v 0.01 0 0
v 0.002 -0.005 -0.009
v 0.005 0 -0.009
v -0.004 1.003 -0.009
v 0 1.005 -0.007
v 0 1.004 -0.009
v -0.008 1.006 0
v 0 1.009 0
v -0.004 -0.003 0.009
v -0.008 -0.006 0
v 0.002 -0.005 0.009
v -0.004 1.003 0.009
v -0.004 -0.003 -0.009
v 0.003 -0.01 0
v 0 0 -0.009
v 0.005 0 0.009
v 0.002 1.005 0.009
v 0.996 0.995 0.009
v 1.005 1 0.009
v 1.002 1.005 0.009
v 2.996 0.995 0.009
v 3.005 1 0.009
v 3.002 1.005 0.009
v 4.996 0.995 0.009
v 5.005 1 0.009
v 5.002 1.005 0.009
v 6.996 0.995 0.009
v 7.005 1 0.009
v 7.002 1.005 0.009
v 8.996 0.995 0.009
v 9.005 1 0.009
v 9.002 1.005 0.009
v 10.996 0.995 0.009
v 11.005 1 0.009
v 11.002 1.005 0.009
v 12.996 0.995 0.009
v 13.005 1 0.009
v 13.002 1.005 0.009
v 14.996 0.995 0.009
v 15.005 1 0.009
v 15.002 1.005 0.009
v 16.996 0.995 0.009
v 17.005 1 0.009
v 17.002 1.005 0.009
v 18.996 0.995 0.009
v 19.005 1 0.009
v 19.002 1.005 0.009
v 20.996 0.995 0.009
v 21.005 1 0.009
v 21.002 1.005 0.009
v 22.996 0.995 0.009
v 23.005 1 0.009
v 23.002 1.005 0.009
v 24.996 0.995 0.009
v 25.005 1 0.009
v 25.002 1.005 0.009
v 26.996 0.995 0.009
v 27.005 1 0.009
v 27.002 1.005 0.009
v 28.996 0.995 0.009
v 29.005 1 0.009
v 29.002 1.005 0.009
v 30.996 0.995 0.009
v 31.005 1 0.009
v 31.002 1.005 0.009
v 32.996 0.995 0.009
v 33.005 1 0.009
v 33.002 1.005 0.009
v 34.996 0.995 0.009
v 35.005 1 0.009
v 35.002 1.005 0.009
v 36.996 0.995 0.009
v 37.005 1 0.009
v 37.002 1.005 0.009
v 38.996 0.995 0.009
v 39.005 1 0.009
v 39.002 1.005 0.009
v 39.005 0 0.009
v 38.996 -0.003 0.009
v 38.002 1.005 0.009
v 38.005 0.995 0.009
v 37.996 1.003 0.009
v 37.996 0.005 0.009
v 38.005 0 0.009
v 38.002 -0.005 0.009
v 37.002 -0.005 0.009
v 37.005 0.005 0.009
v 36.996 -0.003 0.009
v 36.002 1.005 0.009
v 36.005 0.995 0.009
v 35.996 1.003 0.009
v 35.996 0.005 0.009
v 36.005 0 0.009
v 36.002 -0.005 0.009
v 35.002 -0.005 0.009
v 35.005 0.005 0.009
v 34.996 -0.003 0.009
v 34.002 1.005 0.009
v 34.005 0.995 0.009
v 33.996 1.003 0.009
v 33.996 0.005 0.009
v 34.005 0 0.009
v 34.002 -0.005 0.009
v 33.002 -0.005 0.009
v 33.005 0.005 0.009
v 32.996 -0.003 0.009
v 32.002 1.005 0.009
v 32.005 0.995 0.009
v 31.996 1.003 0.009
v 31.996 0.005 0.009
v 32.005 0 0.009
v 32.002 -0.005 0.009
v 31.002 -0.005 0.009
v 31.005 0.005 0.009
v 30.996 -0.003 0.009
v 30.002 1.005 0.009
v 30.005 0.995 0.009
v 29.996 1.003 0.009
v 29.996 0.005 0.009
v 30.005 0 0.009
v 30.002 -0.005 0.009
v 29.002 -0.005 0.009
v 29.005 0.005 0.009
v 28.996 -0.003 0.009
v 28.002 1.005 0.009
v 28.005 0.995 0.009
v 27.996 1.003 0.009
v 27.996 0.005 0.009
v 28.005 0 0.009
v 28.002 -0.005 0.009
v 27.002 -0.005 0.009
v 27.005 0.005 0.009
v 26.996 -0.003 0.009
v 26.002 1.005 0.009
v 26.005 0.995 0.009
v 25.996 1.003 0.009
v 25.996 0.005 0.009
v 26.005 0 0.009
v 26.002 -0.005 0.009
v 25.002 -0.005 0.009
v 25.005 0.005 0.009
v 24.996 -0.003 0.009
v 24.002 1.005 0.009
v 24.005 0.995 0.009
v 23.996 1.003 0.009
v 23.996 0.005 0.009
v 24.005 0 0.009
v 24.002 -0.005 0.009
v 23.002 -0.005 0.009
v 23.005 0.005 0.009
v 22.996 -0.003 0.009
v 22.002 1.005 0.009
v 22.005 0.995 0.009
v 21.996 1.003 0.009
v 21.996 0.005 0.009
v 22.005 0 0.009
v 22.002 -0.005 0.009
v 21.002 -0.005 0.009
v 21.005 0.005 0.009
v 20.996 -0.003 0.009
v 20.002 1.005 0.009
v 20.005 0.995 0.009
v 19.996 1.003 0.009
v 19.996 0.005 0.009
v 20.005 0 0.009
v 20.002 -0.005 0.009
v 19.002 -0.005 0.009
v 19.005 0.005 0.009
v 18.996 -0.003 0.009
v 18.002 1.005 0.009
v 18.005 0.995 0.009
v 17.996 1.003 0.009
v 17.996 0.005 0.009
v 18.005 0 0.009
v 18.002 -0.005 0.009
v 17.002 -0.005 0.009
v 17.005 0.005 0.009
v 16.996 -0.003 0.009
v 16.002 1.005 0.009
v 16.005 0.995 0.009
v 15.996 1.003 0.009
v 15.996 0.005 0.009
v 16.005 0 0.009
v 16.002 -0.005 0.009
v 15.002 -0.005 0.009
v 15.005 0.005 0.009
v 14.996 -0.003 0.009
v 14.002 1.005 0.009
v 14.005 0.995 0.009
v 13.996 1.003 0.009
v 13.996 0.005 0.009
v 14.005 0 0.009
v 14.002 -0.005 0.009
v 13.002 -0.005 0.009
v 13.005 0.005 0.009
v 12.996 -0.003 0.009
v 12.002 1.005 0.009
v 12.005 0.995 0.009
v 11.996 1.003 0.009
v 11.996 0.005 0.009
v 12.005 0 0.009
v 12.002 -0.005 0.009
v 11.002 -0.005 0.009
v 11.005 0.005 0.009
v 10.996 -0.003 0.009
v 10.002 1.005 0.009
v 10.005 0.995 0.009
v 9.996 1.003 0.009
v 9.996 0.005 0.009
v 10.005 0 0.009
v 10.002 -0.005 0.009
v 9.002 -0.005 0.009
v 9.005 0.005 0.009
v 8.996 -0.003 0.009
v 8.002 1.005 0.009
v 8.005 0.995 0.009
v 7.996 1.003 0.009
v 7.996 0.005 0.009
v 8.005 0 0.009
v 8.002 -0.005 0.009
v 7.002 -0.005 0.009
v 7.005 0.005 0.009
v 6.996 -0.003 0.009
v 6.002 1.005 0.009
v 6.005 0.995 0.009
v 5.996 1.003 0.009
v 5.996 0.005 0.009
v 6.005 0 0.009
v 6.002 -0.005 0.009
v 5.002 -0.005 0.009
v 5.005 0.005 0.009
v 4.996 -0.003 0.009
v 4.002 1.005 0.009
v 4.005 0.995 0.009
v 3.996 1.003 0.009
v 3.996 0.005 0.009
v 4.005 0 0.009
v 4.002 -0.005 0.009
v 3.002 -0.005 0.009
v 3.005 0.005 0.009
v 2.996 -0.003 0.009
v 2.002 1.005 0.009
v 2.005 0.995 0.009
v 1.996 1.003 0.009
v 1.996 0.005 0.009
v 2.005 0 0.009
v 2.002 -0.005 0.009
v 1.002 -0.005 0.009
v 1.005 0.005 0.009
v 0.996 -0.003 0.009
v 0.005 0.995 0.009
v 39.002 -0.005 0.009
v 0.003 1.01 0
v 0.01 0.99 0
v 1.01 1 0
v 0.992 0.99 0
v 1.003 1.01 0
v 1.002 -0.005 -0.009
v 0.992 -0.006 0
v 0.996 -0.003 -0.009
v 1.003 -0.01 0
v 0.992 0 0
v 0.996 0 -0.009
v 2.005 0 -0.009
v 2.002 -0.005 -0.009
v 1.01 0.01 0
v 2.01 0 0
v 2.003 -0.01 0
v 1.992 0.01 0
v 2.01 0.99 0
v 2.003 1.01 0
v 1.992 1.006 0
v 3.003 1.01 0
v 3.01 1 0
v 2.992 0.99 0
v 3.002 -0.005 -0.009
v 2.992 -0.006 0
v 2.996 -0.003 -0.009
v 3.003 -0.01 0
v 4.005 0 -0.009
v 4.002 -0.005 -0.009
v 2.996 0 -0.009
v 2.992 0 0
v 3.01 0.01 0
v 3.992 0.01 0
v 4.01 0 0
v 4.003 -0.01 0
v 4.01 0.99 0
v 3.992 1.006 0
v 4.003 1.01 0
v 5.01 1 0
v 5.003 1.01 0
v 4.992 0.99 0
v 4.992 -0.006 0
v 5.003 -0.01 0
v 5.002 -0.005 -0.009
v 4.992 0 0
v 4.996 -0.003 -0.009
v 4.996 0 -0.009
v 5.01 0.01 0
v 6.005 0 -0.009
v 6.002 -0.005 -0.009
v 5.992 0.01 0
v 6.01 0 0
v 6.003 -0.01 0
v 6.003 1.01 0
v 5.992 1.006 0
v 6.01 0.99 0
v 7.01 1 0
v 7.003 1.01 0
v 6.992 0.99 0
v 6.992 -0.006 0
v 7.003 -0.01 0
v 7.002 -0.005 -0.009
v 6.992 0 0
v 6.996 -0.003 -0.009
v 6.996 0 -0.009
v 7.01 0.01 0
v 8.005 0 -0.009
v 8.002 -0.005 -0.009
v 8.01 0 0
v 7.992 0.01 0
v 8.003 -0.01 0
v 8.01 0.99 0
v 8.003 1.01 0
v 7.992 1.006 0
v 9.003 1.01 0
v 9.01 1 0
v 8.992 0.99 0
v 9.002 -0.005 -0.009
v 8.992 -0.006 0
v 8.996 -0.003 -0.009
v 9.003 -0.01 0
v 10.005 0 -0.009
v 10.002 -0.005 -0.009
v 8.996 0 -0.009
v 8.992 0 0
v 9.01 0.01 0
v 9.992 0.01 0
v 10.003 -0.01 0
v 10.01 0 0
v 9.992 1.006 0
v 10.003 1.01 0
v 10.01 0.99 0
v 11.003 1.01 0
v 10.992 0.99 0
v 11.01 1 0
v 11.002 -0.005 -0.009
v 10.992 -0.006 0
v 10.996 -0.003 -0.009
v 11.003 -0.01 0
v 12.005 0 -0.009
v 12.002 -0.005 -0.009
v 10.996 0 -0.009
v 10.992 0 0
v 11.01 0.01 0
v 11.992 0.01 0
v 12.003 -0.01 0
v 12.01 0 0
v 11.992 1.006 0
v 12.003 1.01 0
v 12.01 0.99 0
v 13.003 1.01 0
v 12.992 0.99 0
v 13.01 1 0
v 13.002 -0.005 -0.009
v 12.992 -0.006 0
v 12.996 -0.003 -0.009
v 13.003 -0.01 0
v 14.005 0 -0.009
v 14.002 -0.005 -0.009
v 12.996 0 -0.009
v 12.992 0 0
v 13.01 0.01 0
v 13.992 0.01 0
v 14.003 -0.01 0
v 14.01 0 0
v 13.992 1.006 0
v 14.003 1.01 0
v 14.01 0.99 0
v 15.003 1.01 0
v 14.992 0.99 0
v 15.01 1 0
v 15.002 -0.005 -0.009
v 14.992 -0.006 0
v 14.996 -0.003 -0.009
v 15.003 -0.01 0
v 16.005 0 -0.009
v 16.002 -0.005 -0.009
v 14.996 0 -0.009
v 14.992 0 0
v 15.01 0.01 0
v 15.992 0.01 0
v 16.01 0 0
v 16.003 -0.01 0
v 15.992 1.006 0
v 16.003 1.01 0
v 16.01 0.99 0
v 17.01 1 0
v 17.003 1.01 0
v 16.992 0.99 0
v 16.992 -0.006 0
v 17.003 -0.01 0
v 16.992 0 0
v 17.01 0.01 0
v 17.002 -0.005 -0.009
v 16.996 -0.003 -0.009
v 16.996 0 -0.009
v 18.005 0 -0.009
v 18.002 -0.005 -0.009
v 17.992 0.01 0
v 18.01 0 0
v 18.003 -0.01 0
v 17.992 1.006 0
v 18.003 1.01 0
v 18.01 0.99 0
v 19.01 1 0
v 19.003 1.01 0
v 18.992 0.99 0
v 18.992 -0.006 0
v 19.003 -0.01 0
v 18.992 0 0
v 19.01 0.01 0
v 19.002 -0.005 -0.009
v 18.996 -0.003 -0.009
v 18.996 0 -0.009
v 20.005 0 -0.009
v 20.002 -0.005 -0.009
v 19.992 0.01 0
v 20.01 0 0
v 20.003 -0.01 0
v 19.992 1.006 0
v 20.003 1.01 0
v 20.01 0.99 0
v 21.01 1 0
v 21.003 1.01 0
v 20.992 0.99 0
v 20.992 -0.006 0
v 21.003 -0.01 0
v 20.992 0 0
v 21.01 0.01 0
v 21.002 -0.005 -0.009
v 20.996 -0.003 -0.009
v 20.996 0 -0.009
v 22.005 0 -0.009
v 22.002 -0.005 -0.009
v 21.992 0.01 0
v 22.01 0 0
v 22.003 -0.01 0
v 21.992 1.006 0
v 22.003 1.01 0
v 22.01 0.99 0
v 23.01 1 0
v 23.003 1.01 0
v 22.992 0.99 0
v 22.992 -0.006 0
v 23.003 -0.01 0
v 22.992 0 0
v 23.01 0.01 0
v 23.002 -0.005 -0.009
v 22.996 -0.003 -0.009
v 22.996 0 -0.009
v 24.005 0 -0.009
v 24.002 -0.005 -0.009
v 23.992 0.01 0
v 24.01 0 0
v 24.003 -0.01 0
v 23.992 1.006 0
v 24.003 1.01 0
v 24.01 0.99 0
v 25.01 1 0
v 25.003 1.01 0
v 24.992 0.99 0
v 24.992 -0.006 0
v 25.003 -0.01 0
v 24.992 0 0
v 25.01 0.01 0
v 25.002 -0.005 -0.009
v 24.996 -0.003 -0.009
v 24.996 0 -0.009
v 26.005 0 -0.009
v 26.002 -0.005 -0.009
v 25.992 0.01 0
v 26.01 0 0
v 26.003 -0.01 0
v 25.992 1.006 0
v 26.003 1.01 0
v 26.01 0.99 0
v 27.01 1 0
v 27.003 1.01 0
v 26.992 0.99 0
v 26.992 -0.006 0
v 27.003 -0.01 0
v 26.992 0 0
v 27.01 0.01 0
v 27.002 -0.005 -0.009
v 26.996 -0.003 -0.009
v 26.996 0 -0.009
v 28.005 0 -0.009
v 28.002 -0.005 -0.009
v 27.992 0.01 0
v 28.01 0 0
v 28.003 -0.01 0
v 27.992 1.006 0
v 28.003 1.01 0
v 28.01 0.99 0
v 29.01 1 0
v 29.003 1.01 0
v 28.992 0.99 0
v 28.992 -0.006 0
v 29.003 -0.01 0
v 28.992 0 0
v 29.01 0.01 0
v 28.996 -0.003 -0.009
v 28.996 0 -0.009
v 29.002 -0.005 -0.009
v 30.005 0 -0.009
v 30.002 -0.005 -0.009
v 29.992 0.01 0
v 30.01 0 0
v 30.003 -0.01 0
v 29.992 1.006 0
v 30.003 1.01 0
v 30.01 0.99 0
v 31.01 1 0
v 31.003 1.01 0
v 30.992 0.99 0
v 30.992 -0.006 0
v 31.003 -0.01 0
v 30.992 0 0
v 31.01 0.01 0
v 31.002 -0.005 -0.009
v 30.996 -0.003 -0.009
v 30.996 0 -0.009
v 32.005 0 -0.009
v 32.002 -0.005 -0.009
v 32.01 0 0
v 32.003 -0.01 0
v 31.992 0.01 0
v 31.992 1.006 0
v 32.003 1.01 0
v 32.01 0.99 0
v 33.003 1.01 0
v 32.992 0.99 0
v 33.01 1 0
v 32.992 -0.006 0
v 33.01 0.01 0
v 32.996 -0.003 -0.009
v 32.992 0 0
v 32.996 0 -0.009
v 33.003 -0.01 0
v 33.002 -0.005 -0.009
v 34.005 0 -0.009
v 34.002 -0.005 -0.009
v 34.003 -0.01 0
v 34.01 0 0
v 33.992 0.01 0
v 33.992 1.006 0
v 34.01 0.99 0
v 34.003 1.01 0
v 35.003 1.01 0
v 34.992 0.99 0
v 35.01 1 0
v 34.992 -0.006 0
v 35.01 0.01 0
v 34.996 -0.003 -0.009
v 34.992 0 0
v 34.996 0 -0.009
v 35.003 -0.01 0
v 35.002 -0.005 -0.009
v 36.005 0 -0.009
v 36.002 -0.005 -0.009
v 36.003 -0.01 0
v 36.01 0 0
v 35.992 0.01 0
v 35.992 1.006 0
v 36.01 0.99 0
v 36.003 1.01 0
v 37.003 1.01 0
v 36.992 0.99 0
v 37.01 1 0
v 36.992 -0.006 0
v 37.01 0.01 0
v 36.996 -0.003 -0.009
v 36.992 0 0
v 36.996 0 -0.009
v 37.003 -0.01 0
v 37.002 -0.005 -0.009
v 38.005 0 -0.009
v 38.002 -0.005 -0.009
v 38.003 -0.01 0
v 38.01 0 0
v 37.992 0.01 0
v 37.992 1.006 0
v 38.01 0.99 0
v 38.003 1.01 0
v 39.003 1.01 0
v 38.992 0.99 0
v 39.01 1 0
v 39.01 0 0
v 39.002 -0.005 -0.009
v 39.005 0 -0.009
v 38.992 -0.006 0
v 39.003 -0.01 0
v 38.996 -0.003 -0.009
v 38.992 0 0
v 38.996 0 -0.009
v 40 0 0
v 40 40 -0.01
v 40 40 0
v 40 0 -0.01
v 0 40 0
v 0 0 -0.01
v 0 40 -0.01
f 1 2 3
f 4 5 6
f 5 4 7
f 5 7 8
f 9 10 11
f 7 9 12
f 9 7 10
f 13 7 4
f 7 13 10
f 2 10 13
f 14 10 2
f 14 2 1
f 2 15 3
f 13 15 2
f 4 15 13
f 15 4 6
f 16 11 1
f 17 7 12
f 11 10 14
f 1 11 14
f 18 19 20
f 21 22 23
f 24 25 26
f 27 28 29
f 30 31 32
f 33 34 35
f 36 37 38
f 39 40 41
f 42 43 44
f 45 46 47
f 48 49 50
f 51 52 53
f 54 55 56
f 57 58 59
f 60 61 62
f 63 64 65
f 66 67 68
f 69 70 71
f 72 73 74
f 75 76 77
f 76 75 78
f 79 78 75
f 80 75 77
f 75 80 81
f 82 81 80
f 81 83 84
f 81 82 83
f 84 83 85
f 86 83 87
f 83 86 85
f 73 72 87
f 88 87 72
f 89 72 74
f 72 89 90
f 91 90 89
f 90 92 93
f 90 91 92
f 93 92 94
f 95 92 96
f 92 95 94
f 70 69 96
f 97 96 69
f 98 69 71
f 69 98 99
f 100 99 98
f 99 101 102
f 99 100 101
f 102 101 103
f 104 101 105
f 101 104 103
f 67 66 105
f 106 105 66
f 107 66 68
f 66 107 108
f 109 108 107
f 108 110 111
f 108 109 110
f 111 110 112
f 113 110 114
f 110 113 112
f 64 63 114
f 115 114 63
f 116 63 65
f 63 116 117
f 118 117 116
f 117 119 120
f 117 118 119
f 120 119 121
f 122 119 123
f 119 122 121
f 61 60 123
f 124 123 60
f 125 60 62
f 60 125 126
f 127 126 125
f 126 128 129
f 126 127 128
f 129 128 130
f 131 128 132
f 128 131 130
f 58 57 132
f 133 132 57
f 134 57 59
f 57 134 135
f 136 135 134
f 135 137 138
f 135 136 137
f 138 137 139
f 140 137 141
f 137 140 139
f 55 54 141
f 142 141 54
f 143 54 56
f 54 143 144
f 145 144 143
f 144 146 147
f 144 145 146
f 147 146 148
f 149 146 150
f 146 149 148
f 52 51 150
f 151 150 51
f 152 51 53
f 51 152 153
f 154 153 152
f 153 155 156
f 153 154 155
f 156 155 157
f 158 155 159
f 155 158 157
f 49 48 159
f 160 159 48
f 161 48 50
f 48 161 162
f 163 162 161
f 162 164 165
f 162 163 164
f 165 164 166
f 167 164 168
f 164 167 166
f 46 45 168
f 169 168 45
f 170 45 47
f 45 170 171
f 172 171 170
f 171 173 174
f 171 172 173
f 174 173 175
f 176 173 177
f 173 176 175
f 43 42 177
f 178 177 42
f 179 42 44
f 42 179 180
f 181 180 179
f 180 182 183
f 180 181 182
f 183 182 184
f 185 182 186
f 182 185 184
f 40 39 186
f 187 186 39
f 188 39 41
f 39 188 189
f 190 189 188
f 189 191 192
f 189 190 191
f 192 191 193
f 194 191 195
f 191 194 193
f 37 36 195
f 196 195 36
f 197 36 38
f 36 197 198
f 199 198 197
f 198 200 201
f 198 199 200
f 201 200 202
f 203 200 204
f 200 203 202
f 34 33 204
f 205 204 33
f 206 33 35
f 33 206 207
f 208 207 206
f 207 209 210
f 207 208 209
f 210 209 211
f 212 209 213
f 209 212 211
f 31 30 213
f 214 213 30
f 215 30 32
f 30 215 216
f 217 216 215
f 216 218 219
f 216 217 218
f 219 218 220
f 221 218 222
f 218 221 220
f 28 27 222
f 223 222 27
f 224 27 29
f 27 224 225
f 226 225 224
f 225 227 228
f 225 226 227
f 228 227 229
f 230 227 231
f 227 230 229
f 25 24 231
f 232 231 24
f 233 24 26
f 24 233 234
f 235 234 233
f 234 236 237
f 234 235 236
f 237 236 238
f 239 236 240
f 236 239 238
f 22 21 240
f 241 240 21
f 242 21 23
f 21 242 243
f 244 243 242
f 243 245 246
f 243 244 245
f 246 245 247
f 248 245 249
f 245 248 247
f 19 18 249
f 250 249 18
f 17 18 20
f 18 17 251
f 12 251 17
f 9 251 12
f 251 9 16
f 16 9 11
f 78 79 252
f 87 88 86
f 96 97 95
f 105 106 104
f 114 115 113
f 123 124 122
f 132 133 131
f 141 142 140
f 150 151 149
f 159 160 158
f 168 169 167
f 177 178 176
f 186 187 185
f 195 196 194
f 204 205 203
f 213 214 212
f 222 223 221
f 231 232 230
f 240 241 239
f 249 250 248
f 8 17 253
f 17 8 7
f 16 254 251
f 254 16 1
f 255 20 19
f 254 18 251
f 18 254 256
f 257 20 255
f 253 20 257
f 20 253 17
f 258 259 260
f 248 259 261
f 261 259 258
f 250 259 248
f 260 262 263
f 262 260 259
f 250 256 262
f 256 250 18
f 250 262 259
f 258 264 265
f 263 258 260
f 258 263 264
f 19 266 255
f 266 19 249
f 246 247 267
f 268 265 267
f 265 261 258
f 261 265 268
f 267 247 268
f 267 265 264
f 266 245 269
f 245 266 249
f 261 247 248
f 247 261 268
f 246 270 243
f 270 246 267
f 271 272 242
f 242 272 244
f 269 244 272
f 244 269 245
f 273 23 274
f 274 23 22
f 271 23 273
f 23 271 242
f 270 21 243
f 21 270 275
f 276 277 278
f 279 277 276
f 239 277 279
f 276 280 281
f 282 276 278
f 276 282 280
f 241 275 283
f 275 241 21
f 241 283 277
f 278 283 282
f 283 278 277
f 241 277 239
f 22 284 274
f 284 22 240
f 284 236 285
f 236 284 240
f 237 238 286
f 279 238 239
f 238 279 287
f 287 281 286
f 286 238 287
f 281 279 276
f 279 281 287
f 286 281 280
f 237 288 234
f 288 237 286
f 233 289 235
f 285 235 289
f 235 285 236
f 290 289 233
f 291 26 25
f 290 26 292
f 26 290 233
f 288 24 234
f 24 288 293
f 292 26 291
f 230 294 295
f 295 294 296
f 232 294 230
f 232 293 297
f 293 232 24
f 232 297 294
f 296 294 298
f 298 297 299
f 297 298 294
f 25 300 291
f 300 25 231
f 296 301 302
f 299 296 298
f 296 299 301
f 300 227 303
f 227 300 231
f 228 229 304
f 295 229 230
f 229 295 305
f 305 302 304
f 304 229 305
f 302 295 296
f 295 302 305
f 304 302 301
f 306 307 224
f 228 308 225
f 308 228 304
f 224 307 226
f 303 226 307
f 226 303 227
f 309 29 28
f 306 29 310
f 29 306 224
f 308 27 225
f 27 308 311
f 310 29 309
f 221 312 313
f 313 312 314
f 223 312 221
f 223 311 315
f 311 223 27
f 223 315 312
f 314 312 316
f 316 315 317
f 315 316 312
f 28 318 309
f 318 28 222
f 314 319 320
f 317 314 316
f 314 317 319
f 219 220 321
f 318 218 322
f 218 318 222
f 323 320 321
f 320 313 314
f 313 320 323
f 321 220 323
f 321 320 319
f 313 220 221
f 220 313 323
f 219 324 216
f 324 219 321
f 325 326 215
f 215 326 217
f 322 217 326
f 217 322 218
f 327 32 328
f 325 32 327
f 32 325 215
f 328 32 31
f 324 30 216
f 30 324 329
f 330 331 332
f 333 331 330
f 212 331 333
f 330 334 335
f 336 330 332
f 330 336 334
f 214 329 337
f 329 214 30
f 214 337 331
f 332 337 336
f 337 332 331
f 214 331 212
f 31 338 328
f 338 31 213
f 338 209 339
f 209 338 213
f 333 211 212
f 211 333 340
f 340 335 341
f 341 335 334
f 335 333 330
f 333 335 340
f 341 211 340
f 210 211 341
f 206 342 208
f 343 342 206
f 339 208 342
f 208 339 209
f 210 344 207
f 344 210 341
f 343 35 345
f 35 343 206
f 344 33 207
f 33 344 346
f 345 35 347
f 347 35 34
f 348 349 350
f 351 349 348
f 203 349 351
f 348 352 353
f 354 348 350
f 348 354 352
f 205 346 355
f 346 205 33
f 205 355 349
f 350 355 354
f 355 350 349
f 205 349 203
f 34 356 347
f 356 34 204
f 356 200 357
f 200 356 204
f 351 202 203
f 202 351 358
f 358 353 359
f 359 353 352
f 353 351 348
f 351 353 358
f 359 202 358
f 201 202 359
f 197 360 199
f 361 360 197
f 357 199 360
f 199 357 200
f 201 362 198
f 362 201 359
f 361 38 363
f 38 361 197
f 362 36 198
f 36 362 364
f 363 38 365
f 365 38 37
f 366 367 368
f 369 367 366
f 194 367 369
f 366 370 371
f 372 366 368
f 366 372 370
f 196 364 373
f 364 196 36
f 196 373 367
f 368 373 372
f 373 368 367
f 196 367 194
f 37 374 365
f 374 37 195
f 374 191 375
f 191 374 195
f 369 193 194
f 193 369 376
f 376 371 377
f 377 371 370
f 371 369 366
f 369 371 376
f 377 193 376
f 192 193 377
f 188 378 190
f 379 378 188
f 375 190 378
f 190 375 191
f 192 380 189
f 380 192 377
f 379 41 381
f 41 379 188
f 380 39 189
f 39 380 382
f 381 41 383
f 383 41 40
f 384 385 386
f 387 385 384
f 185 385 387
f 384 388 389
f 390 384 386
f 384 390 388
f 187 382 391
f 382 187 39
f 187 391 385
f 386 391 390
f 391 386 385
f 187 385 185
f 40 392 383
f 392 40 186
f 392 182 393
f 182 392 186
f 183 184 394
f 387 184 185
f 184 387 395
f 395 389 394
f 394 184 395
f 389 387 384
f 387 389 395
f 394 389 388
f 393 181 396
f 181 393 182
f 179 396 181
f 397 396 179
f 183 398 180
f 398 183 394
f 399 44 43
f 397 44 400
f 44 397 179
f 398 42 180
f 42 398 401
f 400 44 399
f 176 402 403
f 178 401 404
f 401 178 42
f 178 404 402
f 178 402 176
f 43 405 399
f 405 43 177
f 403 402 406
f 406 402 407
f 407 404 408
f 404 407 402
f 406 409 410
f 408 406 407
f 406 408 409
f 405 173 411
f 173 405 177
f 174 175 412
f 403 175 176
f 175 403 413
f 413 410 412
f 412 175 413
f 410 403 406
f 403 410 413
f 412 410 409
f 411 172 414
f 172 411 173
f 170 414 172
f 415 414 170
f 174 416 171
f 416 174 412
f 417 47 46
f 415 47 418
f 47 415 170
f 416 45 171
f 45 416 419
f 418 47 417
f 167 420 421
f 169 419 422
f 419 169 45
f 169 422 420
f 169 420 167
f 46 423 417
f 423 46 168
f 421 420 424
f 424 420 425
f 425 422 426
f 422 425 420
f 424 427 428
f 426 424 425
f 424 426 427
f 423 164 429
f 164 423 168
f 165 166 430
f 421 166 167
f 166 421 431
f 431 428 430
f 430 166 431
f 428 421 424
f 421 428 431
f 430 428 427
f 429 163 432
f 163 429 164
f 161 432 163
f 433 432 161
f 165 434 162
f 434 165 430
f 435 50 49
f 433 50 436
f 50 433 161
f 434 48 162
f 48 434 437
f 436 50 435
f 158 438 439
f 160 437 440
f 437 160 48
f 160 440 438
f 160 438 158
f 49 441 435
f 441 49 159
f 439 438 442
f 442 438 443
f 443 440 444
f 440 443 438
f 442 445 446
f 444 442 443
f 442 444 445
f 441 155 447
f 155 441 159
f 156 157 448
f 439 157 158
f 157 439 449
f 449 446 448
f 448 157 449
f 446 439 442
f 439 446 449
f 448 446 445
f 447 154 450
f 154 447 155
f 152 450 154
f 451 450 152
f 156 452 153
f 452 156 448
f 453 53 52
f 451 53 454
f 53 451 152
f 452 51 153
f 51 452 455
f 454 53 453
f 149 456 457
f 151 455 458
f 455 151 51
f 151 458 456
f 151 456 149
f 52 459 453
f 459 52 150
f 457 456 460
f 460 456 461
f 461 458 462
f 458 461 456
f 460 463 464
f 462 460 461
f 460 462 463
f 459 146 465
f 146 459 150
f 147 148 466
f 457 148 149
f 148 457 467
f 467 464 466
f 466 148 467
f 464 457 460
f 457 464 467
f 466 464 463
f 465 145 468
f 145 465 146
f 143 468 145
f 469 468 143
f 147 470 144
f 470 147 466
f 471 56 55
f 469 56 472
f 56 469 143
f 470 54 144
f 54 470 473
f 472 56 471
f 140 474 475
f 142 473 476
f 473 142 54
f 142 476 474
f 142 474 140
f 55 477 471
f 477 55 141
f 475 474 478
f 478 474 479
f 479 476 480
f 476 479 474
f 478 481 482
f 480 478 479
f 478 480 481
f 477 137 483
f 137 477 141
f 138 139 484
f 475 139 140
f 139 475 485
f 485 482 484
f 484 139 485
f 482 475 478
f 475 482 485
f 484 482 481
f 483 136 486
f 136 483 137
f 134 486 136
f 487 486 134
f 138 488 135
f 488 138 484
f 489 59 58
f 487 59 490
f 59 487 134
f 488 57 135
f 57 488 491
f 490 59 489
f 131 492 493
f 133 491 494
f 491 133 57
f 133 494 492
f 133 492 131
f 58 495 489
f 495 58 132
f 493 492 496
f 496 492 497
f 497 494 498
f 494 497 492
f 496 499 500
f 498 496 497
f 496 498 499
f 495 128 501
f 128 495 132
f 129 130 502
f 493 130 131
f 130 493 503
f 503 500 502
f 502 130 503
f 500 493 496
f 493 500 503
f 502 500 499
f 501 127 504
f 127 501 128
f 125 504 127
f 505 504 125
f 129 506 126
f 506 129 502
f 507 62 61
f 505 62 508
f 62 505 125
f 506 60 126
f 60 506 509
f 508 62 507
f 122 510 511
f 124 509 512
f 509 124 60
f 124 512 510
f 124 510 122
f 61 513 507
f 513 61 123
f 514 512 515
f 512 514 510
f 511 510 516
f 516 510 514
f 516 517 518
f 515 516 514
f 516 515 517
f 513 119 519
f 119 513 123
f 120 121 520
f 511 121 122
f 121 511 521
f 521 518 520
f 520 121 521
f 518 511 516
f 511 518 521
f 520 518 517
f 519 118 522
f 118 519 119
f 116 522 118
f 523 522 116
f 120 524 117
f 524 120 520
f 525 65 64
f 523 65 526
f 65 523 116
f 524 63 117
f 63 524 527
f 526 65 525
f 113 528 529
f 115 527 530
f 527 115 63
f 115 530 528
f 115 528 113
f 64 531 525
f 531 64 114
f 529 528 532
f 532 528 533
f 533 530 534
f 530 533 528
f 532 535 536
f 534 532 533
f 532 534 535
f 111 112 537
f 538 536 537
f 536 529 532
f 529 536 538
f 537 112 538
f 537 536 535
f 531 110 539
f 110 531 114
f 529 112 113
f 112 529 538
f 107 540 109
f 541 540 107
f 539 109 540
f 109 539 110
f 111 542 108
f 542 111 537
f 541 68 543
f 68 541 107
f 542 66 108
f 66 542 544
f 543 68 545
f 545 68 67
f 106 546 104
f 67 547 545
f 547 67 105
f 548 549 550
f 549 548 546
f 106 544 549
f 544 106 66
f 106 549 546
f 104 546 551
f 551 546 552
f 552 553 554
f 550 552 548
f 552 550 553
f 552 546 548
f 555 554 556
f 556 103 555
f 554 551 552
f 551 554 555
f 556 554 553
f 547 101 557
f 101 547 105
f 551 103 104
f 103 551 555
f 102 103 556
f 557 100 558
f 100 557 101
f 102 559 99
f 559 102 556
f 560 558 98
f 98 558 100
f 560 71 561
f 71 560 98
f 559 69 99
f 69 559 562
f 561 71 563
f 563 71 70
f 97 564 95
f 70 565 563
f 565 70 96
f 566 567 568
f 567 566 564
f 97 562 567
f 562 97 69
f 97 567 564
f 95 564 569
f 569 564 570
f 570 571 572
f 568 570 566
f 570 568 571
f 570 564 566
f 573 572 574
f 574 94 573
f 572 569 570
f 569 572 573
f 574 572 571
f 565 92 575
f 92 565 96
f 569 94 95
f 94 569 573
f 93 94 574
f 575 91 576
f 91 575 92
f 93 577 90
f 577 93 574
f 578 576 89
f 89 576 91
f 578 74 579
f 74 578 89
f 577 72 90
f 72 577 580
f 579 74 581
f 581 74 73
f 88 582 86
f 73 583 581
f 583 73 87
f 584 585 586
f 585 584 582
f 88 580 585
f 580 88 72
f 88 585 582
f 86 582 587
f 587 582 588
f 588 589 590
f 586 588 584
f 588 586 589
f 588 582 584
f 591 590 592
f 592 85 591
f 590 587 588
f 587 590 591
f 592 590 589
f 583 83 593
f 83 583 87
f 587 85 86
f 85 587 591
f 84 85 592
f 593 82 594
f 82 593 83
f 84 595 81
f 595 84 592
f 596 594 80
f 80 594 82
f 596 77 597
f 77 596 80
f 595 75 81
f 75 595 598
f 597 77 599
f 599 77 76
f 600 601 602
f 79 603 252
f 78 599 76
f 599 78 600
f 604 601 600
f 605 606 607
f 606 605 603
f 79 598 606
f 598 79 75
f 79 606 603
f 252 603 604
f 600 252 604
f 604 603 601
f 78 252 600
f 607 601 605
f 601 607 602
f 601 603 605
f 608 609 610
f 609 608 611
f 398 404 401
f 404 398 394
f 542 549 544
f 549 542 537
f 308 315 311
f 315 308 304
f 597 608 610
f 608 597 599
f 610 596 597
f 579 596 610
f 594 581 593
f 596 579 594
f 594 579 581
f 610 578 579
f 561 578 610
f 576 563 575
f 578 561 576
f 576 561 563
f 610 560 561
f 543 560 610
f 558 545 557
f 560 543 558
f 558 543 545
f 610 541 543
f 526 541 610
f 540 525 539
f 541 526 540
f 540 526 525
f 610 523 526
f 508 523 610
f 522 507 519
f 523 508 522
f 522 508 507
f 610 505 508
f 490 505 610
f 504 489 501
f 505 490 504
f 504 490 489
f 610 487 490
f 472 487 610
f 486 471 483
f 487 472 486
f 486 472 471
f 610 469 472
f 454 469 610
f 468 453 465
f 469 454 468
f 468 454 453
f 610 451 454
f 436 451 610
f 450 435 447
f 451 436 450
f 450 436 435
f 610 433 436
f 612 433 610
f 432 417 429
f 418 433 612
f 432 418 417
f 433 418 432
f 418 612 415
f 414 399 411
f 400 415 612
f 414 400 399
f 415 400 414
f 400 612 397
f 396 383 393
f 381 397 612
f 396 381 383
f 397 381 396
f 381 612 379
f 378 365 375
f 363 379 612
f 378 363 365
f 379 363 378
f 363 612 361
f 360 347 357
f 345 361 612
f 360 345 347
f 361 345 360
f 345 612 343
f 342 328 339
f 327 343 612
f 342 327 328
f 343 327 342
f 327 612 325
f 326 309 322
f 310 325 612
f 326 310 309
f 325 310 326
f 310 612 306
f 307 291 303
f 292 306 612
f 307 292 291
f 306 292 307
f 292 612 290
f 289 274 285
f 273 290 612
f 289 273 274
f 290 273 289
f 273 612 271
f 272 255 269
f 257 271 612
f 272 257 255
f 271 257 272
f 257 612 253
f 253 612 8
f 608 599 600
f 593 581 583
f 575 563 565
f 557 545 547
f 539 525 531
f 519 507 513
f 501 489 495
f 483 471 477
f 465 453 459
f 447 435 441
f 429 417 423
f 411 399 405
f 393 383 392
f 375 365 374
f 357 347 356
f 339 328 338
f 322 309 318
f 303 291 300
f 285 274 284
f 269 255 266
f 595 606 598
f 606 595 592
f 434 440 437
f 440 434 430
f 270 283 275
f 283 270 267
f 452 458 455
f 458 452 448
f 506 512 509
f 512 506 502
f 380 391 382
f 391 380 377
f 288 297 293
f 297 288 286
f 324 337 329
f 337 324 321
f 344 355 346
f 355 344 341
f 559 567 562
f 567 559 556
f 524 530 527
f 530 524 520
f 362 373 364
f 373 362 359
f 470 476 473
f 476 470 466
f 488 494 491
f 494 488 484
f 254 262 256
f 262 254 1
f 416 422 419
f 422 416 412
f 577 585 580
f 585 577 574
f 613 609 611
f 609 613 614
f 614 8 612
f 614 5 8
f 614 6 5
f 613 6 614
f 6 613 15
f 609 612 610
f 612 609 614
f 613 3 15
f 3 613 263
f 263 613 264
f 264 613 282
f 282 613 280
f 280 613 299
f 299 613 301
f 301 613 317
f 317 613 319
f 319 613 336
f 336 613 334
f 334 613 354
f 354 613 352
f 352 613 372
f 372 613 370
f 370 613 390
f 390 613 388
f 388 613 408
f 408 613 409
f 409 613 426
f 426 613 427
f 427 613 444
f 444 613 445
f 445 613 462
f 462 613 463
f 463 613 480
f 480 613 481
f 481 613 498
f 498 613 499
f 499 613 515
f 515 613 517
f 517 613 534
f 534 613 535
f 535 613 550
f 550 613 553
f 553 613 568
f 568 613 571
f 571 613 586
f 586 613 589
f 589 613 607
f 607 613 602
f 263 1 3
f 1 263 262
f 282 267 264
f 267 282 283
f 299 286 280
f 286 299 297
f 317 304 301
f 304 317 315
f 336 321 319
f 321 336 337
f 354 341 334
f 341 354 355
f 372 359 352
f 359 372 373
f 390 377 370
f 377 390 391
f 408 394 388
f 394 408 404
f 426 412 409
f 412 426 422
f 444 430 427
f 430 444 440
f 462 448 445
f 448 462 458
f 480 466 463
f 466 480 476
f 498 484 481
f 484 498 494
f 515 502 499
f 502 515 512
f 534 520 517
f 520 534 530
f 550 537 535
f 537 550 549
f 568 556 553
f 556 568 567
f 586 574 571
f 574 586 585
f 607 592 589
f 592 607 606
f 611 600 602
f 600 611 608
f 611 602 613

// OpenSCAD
hull(){
    translate([0, 0]) sphere(0.01);
    translate([0, 1]) sphere(0.01);
}
hull(){
    translate([0, 1]) sphere(0.01);
    translate([1, 1]) sphere(0.01);
}
hull(){
    translate([1, 1]) sphere(0.01);
    translate([1, 0]) sphere(0.01);
}
hull(){
    translate([1, 0]) sphere(0.01);
    translate([2, 0]) sphere(0.01);
}
hull(){
    translate([2, 0]) sphere(0.01);
    translate([2, 1]) sphere(0.01);
}
hull(){
    translate([2, 1]) sphere(0.01);
    translate([3, 1]) sphere(0.01);
}
hull(){
    translate([3, 1]) sphere(0.01);
    translate([3, 0]) sphere(0.01);
}
hull(){
    translate([3, 0]) sphere(0.01);
    translate([4, 0]) sphere(0.01);
}
hull(){
    translate([4, 0]) sphere(0.01);
    translate([4, 1]) sphere(0.01);
}
hull(){
    translate([4, 1]) sphere(0.01);
    translate([5, 1]) sphere(0.01);
}
hull(){
    translate([5, 1]) sphere(0.01);
    translate([5, 0]) sphere(0.01);
}
hull(){
    translate([5, 0]) sphere(0.01);
    translate([6, 0]) sphere(0.01);
}
hull(){
    translate([6, 0]) sphere(0.01);
    translate([6, 1]) sphere(0.01);
}
hull(){
    translate([6, 1]) sphere(0.01);
    translate([7, 1]) sphere(0.01);
}
hull(){
    translate([7, 1]) sphere(0.01);
    translate([7, 0]) sphere(0.01);
}
hull(){
    translate([7, 0]) sphere(0.01);
    translate([8, 0]) sphere(0.01);
}
hull(){
    translate([8, 0]) sphere(0.01);
    translate([8, 1]) sphere(0.01);
}
hull(){
    translate([8, 1]) sphere(0.01);
    translate([9, 1]) sphere(0.01);
}
hull(){
    translate([9, 1]) sphere(0.01);
    translate([9, 0]) sphere(0.01);
}
hull(){
    translate([9, 0]) sphere(0.01);
    translate([10, 0]) sphere(0.01);
}
hull(){
    translate([10, 0]) sphere(0.01);
    translate([10, 1]) sphere(0.01);
}
hull(){
    translate([10, 1]) sphere(0.01);
    translate([11, 1]) sphere(0.01);
}
hull(){
    translate([11, 1]) sphere(0.01);
    translate([11, 0]) sphere(0.01);
}
hull(){
    translate([11, 0]) sphere(0.01);
    translate([12, 0]) sphere(0.01);
}
hull(){
    translate([12, 0]) sphere(0.01);
    translate([12, 1]) sphere(0.01);
}
hull(){
    translate([12, 1]) sphere(0.01);
    translate([13, 1]) sphere(0.01);
}
hull(){
    translate([13, 1]) sphere(0.01);
    translate([13, 0]) sphere(0.01);
}
hull(){
    translate([13, 0]) sphere(0.01);
    translate([14, 0]) sphere(0.01);
}
hull(){
    translate([14, 0]) sphere(0.01);
    translate([14, 1]) sphere(0.01);
}
hull(){
    translate([14, 1]) sphere(0.01);
    translate([15, 1]) sphere(0.01);
}
hull(){
    translate([15, 1]) sphere(0.01);
    translate([15, 0]) sphere(0.01);
}
hull(){
    translate([15, 0]) sphere(0.01);
    translate([16, 0]) sphere(0.01);
}
hull(){
    translate([16, 0]) sphere(0.01);
    translate([16, 1]) sphere(0.01);
}
hull(){
    translate([16, 1]) sphere(0.01);
    translate([17, 1]) sphere(0.01);
}
hull(){
    translate([17, 1]) sphere(0.01);
    translate([17, 0]) sphere(0.01);
}
hull(){
    translate([17, 0]) sphere(0.01);
    translate([18, 0]) sphere(0.01);
}
hull(){
    translate([18, 0]) sphere(0.01);
    translate([18, 1]) sphere(0.01);
}
hull(){
    translate([18, 1]) sphere(0.01);
    translate([19, 1]) sphere(0.01);
}
hull(){
    translate([19, 1]) sphere(0.01);
    translate([19, 0]) sphere(0.01);
}
hull(){
    translate([19, 0]) sphere(0.01);
    translate([20, 0]) sphere(0.01);
}
hull(){
    translate([20, 0]) sphere(0.01);
    translate([20, 1]) sphere(0.01);
}
hull(){
    translate([20, 1]) sphere(0.01);
    translate([21, 1]) sphere(0.01);
}
hull(){
    translate([21, 1]) sphere(0.01);
    translate([21, 0]) sphere(0.01);
}
hull(){
    translate([21, 0]) sphere(0.01);
    translate([22, 0]) sphere(0.01);
}
hull(){
    translate([22, 0]) sphere(0.01);
    translate([22, 1]) sphere(0.01);
}
hull(){
    translate([22, 1]) sphere(0.01);
    translate([23, 1]) sphere(0.01);
}
hull(){
    translate([23, 1]) sphere(0.01);
    translate([23, 0]) sphere(0.01);
}
hull(){
    translate([23, 0]) sphere(0.01);
    translate([24, 0]) sphere(0.01);
}
hull(){
    translate([24, 0]) sphere(0.01);
    translate([24, 1]) sphere(0.01);
}
hull(){
    translate([24, 1]) sphere(0.01);
    translate([25, 1]) sphere(0.01);
}
hull(){
    translate([25, 1]) sphere(0.01);
    translate([25, 0]) sphere(0.01);
}
hull(){
    translate([25, 0]) sphere(0.01);
    translate([26, 0]) sphere(0.01);
}
hull(){
    translate([26, 0]) sphere(0.01);
    translate([26, 1]) sphere(0.01);
}
hull(){
    translate([26, 1]) sphere(0.01);
    translate([27, 1]) sphere(0.01);
}
hull(){
    translate([27, 1]) sphere(0.01);
    translate([27, 0]) sphere(0.01);
}
hull(){
    translate([27, 0]) sphere(0.01);
    translate([28, 0]) sphere(0.01);
}
hull(){
    translate([28, 0]) sphere(0.01);
    translate([28, 1]) sphere(0.01);
}
hull(){
    translate([28, 1]) sphere(0.01);
    translate([29, 1]) sphere(0.01);
}
hull(){
    translate([29, 1]) sphere(0.01);
    translate([29, 0]) sphere(0.01);
}
hull(){
    translate([29, 0]) sphere(0.01);
    translate([30, 0]) sphere(0.01);
}
hull(){
    translate([30, 0]) sphere(0.01);
    translate([30, 1]) sphere(0.01);
}
hull(){
    translate([30, 1]) sphere(0.01);
    translate([31, 1]) sphere(0.01);
}
hull(){
    translate([31, 1]) sphere(0.01);
    translate([31, 0]) sphere(0.01);
}
hull(){
    translate([31, 0]) sphere(0.01);
    translate([32, 0]) sphere(0.01);
}
hull(){
    translate([32, 0]) sphere(0.01);
    translate([32, 1]) sphere(0.01);
}
hull(){
    translate([32, 1]) sphere(0.01);
    translate([33, 1]) sphere(0.01);
}
hull(){
    translate([33, 1]) sphere(0.01);
    translate([33, 0]) sphere(0.01);
}
hull(){
    translate([33, 0]) sphere(0.01);
    translate([34, 0]) sphere(0.01);
}
hull(){
    translate([34, 0]) sphere(0.01);
    translate([34, 1]) sphere(0.01);
}
hull(){
    translate([34, 1]) sphere(0.01);
    translate([35, 1]) sphere(0.01);
}
hull(){
    translate([35, 1]) sphere(0.01);
    translate([35, 0]) sphere(0.01);
}
hull(){
    translate([35, 0]) sphere(0.01);
    translate([36, 0]) sphere(0.01);
}
hull(){
    translate([36, 0]) sphere(0.01);
    translate([36, 1]) sphere(0.01);
}
hull(){
    translate([36, 1]) sphere(0.01);
    translate([37, 1]) sphere(0.01);
}
hull(){
    translate([37, 1]) sphere(0.01);
    translate([37, 0]) sphere(0.01);
}
hull(){
    translate([37, 0]) sphere(0.01);
    translate([38, 0]) sphere(0.01);
}
hull(){
    translate([38, 0]) sphere(0.01);
    translate([38, 1]) sphere(0.01);
}
hull(){
    translate([38, 1]) sphere(0.01);
    translate([39, 1]) sphere(0.01);
}
hull(){
    translate([39, 1]) sphere(0.01);
    translate([39, 0]) sphere(0.01);
}
translate([0,0,-0.01]) color([0.1,0.1,0.1]) cube([40,40,0.01]);
